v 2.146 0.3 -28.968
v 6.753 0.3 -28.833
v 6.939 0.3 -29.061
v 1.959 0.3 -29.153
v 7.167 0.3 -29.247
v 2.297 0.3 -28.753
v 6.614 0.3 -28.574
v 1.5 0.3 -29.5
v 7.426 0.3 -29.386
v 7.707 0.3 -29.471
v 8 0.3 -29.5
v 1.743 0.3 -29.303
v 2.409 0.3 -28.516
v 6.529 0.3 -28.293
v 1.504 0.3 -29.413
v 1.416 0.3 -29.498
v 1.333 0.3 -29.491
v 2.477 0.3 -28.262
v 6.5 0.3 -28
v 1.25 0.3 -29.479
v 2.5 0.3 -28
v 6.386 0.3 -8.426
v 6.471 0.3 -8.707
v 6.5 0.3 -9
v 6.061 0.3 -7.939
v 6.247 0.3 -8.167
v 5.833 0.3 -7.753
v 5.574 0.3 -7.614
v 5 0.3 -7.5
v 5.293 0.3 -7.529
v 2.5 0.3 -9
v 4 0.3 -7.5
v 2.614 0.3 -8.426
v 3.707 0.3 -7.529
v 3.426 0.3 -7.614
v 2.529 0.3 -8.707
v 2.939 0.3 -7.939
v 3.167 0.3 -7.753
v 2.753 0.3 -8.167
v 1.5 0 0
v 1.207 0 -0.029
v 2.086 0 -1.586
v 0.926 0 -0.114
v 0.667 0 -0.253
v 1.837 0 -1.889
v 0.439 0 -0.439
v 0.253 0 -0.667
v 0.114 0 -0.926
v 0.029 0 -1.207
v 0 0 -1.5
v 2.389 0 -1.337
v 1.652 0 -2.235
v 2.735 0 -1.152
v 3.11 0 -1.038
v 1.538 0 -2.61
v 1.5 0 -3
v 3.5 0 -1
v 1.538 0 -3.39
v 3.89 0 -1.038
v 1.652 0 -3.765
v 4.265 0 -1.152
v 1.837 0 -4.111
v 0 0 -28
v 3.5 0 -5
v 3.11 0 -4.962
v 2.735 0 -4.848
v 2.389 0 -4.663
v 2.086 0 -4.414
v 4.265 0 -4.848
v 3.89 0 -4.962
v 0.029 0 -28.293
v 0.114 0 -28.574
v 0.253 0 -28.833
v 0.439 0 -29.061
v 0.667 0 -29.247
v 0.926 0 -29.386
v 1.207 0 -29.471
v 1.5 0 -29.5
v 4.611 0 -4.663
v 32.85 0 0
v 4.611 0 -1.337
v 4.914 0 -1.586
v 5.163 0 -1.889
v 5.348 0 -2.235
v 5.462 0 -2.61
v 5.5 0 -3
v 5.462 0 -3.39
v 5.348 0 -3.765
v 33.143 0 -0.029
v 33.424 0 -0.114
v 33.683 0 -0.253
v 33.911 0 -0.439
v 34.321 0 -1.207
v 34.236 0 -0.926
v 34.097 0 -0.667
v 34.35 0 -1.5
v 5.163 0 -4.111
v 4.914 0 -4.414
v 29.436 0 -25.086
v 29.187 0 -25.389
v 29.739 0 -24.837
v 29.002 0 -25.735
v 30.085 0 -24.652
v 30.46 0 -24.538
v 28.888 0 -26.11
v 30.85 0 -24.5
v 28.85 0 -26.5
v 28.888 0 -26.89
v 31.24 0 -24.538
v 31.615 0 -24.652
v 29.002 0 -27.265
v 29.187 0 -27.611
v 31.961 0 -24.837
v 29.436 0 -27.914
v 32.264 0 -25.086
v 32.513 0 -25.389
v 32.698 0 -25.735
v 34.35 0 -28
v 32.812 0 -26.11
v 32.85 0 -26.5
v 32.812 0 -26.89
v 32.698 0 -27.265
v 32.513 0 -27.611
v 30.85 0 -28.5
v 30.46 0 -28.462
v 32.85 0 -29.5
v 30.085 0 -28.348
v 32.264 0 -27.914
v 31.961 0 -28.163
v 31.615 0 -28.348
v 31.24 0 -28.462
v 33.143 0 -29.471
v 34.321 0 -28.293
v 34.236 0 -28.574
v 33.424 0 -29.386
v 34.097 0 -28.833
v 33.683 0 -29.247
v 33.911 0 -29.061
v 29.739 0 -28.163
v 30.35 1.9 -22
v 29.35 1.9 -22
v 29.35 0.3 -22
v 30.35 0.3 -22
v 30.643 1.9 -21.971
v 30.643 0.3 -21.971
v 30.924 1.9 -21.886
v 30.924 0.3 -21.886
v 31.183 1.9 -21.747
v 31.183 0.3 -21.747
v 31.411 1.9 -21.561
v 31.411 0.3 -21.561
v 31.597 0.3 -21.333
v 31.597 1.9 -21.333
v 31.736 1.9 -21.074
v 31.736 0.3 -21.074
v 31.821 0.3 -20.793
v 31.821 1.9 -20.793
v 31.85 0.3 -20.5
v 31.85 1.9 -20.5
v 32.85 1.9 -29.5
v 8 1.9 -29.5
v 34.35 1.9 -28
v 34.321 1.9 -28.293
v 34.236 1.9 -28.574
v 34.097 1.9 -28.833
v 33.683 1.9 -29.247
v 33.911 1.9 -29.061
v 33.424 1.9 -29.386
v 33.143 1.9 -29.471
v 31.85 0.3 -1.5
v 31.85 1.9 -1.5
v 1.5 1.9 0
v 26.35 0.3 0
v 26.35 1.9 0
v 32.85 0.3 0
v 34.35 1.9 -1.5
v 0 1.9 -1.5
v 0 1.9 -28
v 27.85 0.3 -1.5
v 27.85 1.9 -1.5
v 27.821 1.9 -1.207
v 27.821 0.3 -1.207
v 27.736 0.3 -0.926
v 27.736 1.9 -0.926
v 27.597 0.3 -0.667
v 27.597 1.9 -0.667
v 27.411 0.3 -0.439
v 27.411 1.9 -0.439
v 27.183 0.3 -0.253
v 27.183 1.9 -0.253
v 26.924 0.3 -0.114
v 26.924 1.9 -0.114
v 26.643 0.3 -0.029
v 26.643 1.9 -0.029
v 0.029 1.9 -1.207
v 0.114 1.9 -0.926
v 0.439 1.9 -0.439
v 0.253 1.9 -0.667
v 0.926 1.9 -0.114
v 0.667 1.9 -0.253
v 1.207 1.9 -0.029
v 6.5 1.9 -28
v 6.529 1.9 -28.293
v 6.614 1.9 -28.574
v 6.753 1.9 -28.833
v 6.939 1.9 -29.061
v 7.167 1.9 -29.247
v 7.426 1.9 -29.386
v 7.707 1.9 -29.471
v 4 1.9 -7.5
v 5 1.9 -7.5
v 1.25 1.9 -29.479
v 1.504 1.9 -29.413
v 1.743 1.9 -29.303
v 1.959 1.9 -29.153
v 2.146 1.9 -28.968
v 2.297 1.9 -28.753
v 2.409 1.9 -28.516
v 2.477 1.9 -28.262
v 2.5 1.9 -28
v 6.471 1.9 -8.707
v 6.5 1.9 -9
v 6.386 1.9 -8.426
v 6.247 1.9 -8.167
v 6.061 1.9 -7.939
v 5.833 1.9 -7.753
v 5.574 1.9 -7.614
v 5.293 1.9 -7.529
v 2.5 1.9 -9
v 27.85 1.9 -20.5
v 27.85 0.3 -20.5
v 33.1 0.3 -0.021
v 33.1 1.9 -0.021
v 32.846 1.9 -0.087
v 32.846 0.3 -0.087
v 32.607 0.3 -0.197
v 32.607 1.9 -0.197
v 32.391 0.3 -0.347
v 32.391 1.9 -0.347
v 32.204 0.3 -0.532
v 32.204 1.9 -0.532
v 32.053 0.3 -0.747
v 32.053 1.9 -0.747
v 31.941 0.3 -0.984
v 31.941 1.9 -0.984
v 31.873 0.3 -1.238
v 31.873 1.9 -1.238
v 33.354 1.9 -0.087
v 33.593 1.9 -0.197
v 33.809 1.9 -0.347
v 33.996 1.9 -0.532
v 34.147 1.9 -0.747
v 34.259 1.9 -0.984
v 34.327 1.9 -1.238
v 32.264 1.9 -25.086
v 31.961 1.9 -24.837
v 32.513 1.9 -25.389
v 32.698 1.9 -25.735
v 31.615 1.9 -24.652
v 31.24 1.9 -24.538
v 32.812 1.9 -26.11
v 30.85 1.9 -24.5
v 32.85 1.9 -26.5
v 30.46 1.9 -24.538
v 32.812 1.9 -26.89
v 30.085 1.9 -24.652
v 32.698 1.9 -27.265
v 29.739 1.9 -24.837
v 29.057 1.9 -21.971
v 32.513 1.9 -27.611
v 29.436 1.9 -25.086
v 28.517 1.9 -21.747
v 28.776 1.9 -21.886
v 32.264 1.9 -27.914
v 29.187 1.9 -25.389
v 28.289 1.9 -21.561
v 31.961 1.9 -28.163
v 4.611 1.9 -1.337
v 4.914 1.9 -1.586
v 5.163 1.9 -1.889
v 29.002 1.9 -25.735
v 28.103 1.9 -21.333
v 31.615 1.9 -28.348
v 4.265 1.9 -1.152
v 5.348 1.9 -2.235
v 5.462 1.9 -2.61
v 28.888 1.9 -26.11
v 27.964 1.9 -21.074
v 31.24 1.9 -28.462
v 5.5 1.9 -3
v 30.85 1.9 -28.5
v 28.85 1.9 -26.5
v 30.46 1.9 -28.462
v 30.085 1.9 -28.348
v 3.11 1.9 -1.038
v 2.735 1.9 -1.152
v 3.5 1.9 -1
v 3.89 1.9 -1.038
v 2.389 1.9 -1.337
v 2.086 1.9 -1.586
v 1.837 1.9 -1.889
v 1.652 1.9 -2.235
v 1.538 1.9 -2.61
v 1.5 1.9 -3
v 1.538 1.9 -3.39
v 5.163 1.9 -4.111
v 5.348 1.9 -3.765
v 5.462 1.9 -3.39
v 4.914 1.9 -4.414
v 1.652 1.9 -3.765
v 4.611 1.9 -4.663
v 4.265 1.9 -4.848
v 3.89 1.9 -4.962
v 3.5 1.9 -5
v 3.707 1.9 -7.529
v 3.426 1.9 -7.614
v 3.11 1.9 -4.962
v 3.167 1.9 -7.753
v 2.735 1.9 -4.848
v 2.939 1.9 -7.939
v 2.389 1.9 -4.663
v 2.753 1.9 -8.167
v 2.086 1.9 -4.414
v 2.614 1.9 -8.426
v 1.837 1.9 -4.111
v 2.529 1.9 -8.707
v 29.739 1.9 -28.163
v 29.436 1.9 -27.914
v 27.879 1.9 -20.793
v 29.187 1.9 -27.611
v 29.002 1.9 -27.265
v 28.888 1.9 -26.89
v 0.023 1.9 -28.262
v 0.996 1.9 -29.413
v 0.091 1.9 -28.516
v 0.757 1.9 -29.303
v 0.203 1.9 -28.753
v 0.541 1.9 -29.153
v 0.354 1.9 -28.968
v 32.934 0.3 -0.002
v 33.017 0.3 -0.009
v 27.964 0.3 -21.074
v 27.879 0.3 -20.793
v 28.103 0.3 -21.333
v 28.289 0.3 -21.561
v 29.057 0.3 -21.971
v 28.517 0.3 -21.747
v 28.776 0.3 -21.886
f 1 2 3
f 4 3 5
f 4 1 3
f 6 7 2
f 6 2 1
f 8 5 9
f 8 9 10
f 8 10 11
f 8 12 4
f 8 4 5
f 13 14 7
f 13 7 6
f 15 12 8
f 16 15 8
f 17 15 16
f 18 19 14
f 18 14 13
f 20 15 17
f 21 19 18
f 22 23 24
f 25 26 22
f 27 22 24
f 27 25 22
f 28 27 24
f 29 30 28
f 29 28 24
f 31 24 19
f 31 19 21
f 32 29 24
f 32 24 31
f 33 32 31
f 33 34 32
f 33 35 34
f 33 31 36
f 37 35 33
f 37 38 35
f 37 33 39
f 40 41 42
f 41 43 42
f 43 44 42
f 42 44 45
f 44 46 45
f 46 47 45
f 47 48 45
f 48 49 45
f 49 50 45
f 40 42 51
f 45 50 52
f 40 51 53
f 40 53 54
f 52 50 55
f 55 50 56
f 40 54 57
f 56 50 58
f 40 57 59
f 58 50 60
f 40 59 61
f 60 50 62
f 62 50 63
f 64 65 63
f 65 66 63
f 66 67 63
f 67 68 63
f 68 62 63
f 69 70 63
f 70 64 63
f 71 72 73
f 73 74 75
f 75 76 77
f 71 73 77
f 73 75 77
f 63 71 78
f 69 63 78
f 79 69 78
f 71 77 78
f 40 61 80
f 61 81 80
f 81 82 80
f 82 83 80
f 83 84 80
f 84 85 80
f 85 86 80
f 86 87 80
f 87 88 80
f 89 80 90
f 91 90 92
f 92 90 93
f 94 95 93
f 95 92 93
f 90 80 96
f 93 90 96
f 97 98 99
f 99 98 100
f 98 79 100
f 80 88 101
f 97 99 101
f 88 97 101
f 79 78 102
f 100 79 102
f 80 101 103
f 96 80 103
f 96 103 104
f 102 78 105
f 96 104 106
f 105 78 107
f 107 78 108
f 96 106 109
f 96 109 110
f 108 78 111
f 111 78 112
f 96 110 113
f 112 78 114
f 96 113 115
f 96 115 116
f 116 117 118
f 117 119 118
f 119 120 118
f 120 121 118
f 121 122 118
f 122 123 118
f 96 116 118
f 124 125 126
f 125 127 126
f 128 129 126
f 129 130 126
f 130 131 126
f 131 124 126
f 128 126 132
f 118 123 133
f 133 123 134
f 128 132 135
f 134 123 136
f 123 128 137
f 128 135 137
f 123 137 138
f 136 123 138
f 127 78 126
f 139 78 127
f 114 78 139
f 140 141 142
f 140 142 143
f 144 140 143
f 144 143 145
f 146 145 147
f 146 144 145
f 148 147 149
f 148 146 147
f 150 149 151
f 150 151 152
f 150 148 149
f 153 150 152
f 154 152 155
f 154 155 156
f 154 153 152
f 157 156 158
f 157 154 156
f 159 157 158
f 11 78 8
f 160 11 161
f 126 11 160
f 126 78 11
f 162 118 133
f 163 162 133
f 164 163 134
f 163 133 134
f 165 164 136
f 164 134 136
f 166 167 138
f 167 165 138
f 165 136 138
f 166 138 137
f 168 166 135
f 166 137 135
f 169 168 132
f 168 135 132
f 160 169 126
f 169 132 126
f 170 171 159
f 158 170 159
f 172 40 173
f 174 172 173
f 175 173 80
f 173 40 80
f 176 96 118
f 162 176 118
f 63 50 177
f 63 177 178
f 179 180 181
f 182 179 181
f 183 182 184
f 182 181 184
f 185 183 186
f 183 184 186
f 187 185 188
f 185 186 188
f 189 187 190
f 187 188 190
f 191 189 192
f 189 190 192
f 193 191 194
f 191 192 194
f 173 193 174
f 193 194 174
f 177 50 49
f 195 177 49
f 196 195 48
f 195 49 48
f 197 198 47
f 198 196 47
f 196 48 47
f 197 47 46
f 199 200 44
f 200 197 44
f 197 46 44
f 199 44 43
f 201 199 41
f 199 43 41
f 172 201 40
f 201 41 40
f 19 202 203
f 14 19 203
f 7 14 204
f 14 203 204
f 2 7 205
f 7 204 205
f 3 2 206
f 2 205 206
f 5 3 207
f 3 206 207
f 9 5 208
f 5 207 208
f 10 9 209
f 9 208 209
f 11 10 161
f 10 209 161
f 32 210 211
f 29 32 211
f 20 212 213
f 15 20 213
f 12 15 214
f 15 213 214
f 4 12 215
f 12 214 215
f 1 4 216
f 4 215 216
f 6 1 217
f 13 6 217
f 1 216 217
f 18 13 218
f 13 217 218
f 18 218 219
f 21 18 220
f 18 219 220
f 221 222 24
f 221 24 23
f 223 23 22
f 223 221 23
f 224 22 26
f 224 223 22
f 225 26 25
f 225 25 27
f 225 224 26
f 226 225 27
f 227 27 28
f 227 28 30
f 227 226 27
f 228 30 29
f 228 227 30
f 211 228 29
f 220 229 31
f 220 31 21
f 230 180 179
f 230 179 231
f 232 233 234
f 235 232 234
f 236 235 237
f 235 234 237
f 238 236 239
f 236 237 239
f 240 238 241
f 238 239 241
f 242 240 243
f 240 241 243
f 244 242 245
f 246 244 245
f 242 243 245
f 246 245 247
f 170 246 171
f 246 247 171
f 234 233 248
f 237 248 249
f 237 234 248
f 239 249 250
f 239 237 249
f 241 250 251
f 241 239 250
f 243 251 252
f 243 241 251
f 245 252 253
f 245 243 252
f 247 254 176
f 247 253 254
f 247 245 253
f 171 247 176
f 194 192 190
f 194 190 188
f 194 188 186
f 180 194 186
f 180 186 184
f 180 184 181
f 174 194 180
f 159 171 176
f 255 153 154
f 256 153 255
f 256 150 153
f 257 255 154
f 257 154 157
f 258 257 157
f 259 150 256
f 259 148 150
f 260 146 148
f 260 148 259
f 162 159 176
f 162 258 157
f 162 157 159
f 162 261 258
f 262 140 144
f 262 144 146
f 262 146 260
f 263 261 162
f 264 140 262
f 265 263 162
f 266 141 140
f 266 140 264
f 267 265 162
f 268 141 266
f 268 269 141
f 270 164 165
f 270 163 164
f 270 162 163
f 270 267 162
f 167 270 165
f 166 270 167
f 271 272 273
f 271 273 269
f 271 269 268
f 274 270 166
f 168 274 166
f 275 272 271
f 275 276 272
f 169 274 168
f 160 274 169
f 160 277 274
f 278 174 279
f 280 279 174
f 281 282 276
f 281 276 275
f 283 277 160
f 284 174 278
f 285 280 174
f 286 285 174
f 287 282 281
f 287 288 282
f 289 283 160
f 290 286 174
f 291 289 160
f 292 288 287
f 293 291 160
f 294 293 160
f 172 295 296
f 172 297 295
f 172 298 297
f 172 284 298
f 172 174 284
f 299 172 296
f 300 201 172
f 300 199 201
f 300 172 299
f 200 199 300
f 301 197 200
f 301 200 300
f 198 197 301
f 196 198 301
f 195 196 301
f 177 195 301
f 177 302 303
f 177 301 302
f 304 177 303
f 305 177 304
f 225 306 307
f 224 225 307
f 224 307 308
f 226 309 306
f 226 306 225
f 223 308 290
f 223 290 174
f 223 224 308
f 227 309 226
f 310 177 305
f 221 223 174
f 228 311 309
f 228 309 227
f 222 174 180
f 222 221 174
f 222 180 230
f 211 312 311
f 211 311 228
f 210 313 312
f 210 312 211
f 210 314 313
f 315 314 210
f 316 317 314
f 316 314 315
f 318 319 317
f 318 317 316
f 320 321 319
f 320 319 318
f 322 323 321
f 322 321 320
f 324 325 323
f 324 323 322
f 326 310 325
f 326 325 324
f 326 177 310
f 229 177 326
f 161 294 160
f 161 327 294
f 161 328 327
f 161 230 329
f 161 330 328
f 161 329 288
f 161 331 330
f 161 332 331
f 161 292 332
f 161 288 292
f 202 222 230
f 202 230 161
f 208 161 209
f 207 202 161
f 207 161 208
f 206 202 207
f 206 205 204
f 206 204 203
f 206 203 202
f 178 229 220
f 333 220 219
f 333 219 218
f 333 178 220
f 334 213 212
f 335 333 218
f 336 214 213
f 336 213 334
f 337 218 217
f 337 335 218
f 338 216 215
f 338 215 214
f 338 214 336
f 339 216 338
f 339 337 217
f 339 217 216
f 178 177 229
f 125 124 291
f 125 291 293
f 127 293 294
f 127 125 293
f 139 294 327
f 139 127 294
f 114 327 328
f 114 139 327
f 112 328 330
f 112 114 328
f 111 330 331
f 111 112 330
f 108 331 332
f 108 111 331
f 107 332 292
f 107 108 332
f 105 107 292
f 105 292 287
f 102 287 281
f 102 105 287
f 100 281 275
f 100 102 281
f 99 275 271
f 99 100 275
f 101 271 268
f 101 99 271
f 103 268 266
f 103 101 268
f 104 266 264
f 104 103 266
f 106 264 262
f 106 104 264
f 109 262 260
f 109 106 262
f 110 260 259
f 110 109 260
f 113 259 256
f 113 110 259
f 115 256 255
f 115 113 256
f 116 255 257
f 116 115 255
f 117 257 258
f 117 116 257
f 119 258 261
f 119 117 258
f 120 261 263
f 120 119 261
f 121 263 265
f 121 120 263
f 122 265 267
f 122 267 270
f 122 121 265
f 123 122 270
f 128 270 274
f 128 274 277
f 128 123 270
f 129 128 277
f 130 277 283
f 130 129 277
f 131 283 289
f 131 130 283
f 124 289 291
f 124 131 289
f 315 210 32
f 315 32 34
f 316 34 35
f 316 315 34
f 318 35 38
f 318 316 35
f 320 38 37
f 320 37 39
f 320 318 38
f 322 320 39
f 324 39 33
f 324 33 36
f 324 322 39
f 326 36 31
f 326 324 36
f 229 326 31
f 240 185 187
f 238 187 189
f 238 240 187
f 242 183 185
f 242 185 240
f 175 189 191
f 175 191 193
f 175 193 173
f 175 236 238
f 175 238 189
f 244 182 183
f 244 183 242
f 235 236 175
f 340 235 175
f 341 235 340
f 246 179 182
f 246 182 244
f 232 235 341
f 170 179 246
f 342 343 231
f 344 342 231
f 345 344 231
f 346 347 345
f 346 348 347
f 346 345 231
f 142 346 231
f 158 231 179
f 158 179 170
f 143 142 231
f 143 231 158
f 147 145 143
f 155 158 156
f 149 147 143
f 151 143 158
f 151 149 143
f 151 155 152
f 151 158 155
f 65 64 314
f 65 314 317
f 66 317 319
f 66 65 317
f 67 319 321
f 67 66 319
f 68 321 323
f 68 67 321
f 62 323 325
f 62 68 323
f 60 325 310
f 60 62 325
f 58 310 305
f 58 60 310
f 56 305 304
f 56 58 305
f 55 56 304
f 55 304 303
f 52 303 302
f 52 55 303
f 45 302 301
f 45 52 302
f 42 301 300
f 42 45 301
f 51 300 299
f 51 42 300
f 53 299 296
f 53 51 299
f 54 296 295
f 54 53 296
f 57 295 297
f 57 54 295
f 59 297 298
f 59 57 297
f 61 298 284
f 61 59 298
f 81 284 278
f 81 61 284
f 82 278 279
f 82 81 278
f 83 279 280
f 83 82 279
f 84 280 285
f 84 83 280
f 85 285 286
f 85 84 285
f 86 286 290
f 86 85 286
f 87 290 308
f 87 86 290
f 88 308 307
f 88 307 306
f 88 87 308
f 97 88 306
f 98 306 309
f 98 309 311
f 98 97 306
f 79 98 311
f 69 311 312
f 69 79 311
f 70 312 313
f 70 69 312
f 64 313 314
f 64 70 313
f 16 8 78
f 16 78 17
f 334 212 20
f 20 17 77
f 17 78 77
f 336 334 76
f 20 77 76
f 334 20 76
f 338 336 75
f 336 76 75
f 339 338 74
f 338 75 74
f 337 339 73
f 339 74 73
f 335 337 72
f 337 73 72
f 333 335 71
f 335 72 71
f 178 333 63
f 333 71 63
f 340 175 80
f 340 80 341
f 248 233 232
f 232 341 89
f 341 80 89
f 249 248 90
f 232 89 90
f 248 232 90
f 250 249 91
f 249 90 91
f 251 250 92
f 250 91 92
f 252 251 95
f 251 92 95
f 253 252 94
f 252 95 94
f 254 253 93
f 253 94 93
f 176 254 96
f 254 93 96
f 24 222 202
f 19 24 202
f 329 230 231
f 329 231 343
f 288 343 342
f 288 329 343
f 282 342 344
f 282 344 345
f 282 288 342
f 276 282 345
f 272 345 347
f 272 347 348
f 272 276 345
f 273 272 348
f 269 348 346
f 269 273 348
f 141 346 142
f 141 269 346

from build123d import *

# Parameters (mm, degrees)
CROQUIS1_W              = 34.35
CROQUIS1_H              = 29.5
CROQUIS1_R              = 2
SALIENTE_EXTRUIR1_DEPTH = 1.9
CROQUIS2_W              = 4
CROQUIS2_H              = 22
CORTAR_EXTRUIR2_DEPTH   = 1.6
REDONDEO1_R             = 1.5


with BuildPart() as part:
    # Croquis1 → Saliente-Extruir1 (new body)
    with BuildSketch(Plane(origin=(0, 0, 0), x_dir=(1, 0, 0), z_dir=(0, 1, 0))):
        with Locations((17.175, 14.75)):
            Rectangle(CROQUIS1_W, CROQUIS1_H)
        with Locations(Location((3.5, 3, 0), (0, 0, 90))):
            Circle(CROQUIS1_R, mode=Mode.SUBTRACT)
        with Locations(Location((30.85, 26.5, 0), (0, 0, 90))):
            Circle(CROQUIS1_R, mode=Mode.SUBTRACT)
    extrude(amount=SALIENTE_EXTRUIR1_DEPTH)

    # Croquis2 → Cortar-Extruir2 (cut)
    with BuildSketch(Plane(origin=(0, 1.9, 0), x_dir=(1, 0, 0), z_dir=(0, 1, 0))):
        with Locations((29.85, 11)):
            Rectangle(CROQUIS2_W, CROQUIS2_H)
        with Locations((4.5, 18.5)):
            Rectangle(CROQUIS2_W, CROQUIS2_H)
    extrude(amount=-CORTAR_EXTRUIR2_DEPTH, mode=Mode.SUBTRACT)

    # Redondeo1
    # the kernel refuses this fillet: 1.5 mm, written as the material it adds along each edge
    with BuildSketch(Plane(origin=(27.85, 1.9, -22), x_dir=(0, 0, 1), z_dir=(0, -1, 0))) as redondeo1_piece_1:
        with BuildLine():
            CenterArc((REDONDEO1_R, -REDONDEO1_R), REDONDEO1_R, 90, 90)
            Line((0, -REDONDEO1_R), (0, 0))
            Line((0, 0), (REDONDEO1_R, 0))
        make_face()
    extrude(amount=1.6)
    with BuildSketch(Plane(origin=(31.85, 1.9, -22), x_dir=(0, 0, 1), z_dir=(0, -1, 0)), Plane(origin=(2.5, 1.9, -7.5), x_dir=(0, 0, -1), z_dir=(0, -1, 0)), Plane(origin=(6.5, 1.9, -7.5), x_dir=(-1, 0, 0), z_dir=(0, -1, 0))) as redondeo1_piece_2:
        with BuildLine():
            CenterArc((REDONDEO1_R, REDONDEO1_R), REDONDEO1_R, 180, 90)
            Line((0, REDONDEO1_R), (0, 0))
            Line((0, 0), (REDONDEO1_R, 0))
        make_face()
    extrude(amount=1.6)
    # the kernel refuses this fillet: 1.5 mm, written as the material it takes off along each edge
    with BuildSketch(Plane(origin=(27.85, 5.65, 0), x_dir=(-1, 0, 0), z_dir=(0, -1, 0)), Plane(origin=(6.5, 5.65, -29.5), x_dir=(1, 0, 0), z_dir=(0, -1, 0))) as redondeo1_2_piece_1:
        with BuildLine():
            CenterArc((REDONDEO1_R, REDONDEO1_R), REDONDEO1_R, 180, 90)
            Line((0, REDONDEO1_R), (0, 0))
            Line((0, 0), (REDONDEO1_R, 0))
        make_face()
    extrude(amount=5.35, mode=Mode.SUBTRACT)
    with BuildSketch(Plane(origin=(31.85, 5.65, 0), x_dir=(1, 0, 0), z_dir=(0, -1, 0)), Plane(origin=(2.5, 5.65, -29.5), x_dir=(-1, 0, 0), z_dir=(0, -1, 0))) as redondeo1_2_piece_2:
        with BuildLine():
            CenterArc((REDONDEO1_R, -REDONDEO1_R), REDONDEO1_R, 90, 90)
            Line((0, -REDONDEO1_R), (0, 0))
            Line((0, 0), (REDONDEO1_R, 0))
        make_face()
    extrude(amount=5.35, mode=Mode.SUBTRACT)
    with BuildSketch(Plane(origin=(0, -3.75, -29.5), x_dir=(0, 0, 1), z_dir=(0, 1, 0)), Plane(origin=(0, -3.75, 0), x_dir=(1, 0, 0), z_dir=(0, 1, 0))) as redondeo1_2_piece_3:
        with BuildLine():
            CenterArc((REDONDEO1_R, REDONDEO1_R), REDONDEO1_R, 180, 90)
            Line((0, REDONDEO1_R), (0, 0))
            Line((0, 0), (REDONDEO1_R, 0))
        make_face()
    extrude(amount=9.4, mode=Mode.SUBTRACT)
    with BuildSketch(Plane(origin=(34.35, -3.75, -29.5), x_dir=(0, 0, 1), z_dir=(0, 1, 0)), Plane(origin=(34.35, -3.75, 0), x_dir=(-1, 0, 0), z_dir=(0, 1, 0))) as redondeo1_2_piece_4:
        with BuildLine():
            CenterArc((REDONDEO1_R, -REDONDEO1_R), REDONDEO1_R, 90, 90)
            Line((0, -REDONDEO1_R), (0, 0))
            Line((0, 0), (REDONDEO1_R, 0))
        make_face()
    extrude(amount=9.4, mode=Mode.SUBTRACT)


solid = part.part
